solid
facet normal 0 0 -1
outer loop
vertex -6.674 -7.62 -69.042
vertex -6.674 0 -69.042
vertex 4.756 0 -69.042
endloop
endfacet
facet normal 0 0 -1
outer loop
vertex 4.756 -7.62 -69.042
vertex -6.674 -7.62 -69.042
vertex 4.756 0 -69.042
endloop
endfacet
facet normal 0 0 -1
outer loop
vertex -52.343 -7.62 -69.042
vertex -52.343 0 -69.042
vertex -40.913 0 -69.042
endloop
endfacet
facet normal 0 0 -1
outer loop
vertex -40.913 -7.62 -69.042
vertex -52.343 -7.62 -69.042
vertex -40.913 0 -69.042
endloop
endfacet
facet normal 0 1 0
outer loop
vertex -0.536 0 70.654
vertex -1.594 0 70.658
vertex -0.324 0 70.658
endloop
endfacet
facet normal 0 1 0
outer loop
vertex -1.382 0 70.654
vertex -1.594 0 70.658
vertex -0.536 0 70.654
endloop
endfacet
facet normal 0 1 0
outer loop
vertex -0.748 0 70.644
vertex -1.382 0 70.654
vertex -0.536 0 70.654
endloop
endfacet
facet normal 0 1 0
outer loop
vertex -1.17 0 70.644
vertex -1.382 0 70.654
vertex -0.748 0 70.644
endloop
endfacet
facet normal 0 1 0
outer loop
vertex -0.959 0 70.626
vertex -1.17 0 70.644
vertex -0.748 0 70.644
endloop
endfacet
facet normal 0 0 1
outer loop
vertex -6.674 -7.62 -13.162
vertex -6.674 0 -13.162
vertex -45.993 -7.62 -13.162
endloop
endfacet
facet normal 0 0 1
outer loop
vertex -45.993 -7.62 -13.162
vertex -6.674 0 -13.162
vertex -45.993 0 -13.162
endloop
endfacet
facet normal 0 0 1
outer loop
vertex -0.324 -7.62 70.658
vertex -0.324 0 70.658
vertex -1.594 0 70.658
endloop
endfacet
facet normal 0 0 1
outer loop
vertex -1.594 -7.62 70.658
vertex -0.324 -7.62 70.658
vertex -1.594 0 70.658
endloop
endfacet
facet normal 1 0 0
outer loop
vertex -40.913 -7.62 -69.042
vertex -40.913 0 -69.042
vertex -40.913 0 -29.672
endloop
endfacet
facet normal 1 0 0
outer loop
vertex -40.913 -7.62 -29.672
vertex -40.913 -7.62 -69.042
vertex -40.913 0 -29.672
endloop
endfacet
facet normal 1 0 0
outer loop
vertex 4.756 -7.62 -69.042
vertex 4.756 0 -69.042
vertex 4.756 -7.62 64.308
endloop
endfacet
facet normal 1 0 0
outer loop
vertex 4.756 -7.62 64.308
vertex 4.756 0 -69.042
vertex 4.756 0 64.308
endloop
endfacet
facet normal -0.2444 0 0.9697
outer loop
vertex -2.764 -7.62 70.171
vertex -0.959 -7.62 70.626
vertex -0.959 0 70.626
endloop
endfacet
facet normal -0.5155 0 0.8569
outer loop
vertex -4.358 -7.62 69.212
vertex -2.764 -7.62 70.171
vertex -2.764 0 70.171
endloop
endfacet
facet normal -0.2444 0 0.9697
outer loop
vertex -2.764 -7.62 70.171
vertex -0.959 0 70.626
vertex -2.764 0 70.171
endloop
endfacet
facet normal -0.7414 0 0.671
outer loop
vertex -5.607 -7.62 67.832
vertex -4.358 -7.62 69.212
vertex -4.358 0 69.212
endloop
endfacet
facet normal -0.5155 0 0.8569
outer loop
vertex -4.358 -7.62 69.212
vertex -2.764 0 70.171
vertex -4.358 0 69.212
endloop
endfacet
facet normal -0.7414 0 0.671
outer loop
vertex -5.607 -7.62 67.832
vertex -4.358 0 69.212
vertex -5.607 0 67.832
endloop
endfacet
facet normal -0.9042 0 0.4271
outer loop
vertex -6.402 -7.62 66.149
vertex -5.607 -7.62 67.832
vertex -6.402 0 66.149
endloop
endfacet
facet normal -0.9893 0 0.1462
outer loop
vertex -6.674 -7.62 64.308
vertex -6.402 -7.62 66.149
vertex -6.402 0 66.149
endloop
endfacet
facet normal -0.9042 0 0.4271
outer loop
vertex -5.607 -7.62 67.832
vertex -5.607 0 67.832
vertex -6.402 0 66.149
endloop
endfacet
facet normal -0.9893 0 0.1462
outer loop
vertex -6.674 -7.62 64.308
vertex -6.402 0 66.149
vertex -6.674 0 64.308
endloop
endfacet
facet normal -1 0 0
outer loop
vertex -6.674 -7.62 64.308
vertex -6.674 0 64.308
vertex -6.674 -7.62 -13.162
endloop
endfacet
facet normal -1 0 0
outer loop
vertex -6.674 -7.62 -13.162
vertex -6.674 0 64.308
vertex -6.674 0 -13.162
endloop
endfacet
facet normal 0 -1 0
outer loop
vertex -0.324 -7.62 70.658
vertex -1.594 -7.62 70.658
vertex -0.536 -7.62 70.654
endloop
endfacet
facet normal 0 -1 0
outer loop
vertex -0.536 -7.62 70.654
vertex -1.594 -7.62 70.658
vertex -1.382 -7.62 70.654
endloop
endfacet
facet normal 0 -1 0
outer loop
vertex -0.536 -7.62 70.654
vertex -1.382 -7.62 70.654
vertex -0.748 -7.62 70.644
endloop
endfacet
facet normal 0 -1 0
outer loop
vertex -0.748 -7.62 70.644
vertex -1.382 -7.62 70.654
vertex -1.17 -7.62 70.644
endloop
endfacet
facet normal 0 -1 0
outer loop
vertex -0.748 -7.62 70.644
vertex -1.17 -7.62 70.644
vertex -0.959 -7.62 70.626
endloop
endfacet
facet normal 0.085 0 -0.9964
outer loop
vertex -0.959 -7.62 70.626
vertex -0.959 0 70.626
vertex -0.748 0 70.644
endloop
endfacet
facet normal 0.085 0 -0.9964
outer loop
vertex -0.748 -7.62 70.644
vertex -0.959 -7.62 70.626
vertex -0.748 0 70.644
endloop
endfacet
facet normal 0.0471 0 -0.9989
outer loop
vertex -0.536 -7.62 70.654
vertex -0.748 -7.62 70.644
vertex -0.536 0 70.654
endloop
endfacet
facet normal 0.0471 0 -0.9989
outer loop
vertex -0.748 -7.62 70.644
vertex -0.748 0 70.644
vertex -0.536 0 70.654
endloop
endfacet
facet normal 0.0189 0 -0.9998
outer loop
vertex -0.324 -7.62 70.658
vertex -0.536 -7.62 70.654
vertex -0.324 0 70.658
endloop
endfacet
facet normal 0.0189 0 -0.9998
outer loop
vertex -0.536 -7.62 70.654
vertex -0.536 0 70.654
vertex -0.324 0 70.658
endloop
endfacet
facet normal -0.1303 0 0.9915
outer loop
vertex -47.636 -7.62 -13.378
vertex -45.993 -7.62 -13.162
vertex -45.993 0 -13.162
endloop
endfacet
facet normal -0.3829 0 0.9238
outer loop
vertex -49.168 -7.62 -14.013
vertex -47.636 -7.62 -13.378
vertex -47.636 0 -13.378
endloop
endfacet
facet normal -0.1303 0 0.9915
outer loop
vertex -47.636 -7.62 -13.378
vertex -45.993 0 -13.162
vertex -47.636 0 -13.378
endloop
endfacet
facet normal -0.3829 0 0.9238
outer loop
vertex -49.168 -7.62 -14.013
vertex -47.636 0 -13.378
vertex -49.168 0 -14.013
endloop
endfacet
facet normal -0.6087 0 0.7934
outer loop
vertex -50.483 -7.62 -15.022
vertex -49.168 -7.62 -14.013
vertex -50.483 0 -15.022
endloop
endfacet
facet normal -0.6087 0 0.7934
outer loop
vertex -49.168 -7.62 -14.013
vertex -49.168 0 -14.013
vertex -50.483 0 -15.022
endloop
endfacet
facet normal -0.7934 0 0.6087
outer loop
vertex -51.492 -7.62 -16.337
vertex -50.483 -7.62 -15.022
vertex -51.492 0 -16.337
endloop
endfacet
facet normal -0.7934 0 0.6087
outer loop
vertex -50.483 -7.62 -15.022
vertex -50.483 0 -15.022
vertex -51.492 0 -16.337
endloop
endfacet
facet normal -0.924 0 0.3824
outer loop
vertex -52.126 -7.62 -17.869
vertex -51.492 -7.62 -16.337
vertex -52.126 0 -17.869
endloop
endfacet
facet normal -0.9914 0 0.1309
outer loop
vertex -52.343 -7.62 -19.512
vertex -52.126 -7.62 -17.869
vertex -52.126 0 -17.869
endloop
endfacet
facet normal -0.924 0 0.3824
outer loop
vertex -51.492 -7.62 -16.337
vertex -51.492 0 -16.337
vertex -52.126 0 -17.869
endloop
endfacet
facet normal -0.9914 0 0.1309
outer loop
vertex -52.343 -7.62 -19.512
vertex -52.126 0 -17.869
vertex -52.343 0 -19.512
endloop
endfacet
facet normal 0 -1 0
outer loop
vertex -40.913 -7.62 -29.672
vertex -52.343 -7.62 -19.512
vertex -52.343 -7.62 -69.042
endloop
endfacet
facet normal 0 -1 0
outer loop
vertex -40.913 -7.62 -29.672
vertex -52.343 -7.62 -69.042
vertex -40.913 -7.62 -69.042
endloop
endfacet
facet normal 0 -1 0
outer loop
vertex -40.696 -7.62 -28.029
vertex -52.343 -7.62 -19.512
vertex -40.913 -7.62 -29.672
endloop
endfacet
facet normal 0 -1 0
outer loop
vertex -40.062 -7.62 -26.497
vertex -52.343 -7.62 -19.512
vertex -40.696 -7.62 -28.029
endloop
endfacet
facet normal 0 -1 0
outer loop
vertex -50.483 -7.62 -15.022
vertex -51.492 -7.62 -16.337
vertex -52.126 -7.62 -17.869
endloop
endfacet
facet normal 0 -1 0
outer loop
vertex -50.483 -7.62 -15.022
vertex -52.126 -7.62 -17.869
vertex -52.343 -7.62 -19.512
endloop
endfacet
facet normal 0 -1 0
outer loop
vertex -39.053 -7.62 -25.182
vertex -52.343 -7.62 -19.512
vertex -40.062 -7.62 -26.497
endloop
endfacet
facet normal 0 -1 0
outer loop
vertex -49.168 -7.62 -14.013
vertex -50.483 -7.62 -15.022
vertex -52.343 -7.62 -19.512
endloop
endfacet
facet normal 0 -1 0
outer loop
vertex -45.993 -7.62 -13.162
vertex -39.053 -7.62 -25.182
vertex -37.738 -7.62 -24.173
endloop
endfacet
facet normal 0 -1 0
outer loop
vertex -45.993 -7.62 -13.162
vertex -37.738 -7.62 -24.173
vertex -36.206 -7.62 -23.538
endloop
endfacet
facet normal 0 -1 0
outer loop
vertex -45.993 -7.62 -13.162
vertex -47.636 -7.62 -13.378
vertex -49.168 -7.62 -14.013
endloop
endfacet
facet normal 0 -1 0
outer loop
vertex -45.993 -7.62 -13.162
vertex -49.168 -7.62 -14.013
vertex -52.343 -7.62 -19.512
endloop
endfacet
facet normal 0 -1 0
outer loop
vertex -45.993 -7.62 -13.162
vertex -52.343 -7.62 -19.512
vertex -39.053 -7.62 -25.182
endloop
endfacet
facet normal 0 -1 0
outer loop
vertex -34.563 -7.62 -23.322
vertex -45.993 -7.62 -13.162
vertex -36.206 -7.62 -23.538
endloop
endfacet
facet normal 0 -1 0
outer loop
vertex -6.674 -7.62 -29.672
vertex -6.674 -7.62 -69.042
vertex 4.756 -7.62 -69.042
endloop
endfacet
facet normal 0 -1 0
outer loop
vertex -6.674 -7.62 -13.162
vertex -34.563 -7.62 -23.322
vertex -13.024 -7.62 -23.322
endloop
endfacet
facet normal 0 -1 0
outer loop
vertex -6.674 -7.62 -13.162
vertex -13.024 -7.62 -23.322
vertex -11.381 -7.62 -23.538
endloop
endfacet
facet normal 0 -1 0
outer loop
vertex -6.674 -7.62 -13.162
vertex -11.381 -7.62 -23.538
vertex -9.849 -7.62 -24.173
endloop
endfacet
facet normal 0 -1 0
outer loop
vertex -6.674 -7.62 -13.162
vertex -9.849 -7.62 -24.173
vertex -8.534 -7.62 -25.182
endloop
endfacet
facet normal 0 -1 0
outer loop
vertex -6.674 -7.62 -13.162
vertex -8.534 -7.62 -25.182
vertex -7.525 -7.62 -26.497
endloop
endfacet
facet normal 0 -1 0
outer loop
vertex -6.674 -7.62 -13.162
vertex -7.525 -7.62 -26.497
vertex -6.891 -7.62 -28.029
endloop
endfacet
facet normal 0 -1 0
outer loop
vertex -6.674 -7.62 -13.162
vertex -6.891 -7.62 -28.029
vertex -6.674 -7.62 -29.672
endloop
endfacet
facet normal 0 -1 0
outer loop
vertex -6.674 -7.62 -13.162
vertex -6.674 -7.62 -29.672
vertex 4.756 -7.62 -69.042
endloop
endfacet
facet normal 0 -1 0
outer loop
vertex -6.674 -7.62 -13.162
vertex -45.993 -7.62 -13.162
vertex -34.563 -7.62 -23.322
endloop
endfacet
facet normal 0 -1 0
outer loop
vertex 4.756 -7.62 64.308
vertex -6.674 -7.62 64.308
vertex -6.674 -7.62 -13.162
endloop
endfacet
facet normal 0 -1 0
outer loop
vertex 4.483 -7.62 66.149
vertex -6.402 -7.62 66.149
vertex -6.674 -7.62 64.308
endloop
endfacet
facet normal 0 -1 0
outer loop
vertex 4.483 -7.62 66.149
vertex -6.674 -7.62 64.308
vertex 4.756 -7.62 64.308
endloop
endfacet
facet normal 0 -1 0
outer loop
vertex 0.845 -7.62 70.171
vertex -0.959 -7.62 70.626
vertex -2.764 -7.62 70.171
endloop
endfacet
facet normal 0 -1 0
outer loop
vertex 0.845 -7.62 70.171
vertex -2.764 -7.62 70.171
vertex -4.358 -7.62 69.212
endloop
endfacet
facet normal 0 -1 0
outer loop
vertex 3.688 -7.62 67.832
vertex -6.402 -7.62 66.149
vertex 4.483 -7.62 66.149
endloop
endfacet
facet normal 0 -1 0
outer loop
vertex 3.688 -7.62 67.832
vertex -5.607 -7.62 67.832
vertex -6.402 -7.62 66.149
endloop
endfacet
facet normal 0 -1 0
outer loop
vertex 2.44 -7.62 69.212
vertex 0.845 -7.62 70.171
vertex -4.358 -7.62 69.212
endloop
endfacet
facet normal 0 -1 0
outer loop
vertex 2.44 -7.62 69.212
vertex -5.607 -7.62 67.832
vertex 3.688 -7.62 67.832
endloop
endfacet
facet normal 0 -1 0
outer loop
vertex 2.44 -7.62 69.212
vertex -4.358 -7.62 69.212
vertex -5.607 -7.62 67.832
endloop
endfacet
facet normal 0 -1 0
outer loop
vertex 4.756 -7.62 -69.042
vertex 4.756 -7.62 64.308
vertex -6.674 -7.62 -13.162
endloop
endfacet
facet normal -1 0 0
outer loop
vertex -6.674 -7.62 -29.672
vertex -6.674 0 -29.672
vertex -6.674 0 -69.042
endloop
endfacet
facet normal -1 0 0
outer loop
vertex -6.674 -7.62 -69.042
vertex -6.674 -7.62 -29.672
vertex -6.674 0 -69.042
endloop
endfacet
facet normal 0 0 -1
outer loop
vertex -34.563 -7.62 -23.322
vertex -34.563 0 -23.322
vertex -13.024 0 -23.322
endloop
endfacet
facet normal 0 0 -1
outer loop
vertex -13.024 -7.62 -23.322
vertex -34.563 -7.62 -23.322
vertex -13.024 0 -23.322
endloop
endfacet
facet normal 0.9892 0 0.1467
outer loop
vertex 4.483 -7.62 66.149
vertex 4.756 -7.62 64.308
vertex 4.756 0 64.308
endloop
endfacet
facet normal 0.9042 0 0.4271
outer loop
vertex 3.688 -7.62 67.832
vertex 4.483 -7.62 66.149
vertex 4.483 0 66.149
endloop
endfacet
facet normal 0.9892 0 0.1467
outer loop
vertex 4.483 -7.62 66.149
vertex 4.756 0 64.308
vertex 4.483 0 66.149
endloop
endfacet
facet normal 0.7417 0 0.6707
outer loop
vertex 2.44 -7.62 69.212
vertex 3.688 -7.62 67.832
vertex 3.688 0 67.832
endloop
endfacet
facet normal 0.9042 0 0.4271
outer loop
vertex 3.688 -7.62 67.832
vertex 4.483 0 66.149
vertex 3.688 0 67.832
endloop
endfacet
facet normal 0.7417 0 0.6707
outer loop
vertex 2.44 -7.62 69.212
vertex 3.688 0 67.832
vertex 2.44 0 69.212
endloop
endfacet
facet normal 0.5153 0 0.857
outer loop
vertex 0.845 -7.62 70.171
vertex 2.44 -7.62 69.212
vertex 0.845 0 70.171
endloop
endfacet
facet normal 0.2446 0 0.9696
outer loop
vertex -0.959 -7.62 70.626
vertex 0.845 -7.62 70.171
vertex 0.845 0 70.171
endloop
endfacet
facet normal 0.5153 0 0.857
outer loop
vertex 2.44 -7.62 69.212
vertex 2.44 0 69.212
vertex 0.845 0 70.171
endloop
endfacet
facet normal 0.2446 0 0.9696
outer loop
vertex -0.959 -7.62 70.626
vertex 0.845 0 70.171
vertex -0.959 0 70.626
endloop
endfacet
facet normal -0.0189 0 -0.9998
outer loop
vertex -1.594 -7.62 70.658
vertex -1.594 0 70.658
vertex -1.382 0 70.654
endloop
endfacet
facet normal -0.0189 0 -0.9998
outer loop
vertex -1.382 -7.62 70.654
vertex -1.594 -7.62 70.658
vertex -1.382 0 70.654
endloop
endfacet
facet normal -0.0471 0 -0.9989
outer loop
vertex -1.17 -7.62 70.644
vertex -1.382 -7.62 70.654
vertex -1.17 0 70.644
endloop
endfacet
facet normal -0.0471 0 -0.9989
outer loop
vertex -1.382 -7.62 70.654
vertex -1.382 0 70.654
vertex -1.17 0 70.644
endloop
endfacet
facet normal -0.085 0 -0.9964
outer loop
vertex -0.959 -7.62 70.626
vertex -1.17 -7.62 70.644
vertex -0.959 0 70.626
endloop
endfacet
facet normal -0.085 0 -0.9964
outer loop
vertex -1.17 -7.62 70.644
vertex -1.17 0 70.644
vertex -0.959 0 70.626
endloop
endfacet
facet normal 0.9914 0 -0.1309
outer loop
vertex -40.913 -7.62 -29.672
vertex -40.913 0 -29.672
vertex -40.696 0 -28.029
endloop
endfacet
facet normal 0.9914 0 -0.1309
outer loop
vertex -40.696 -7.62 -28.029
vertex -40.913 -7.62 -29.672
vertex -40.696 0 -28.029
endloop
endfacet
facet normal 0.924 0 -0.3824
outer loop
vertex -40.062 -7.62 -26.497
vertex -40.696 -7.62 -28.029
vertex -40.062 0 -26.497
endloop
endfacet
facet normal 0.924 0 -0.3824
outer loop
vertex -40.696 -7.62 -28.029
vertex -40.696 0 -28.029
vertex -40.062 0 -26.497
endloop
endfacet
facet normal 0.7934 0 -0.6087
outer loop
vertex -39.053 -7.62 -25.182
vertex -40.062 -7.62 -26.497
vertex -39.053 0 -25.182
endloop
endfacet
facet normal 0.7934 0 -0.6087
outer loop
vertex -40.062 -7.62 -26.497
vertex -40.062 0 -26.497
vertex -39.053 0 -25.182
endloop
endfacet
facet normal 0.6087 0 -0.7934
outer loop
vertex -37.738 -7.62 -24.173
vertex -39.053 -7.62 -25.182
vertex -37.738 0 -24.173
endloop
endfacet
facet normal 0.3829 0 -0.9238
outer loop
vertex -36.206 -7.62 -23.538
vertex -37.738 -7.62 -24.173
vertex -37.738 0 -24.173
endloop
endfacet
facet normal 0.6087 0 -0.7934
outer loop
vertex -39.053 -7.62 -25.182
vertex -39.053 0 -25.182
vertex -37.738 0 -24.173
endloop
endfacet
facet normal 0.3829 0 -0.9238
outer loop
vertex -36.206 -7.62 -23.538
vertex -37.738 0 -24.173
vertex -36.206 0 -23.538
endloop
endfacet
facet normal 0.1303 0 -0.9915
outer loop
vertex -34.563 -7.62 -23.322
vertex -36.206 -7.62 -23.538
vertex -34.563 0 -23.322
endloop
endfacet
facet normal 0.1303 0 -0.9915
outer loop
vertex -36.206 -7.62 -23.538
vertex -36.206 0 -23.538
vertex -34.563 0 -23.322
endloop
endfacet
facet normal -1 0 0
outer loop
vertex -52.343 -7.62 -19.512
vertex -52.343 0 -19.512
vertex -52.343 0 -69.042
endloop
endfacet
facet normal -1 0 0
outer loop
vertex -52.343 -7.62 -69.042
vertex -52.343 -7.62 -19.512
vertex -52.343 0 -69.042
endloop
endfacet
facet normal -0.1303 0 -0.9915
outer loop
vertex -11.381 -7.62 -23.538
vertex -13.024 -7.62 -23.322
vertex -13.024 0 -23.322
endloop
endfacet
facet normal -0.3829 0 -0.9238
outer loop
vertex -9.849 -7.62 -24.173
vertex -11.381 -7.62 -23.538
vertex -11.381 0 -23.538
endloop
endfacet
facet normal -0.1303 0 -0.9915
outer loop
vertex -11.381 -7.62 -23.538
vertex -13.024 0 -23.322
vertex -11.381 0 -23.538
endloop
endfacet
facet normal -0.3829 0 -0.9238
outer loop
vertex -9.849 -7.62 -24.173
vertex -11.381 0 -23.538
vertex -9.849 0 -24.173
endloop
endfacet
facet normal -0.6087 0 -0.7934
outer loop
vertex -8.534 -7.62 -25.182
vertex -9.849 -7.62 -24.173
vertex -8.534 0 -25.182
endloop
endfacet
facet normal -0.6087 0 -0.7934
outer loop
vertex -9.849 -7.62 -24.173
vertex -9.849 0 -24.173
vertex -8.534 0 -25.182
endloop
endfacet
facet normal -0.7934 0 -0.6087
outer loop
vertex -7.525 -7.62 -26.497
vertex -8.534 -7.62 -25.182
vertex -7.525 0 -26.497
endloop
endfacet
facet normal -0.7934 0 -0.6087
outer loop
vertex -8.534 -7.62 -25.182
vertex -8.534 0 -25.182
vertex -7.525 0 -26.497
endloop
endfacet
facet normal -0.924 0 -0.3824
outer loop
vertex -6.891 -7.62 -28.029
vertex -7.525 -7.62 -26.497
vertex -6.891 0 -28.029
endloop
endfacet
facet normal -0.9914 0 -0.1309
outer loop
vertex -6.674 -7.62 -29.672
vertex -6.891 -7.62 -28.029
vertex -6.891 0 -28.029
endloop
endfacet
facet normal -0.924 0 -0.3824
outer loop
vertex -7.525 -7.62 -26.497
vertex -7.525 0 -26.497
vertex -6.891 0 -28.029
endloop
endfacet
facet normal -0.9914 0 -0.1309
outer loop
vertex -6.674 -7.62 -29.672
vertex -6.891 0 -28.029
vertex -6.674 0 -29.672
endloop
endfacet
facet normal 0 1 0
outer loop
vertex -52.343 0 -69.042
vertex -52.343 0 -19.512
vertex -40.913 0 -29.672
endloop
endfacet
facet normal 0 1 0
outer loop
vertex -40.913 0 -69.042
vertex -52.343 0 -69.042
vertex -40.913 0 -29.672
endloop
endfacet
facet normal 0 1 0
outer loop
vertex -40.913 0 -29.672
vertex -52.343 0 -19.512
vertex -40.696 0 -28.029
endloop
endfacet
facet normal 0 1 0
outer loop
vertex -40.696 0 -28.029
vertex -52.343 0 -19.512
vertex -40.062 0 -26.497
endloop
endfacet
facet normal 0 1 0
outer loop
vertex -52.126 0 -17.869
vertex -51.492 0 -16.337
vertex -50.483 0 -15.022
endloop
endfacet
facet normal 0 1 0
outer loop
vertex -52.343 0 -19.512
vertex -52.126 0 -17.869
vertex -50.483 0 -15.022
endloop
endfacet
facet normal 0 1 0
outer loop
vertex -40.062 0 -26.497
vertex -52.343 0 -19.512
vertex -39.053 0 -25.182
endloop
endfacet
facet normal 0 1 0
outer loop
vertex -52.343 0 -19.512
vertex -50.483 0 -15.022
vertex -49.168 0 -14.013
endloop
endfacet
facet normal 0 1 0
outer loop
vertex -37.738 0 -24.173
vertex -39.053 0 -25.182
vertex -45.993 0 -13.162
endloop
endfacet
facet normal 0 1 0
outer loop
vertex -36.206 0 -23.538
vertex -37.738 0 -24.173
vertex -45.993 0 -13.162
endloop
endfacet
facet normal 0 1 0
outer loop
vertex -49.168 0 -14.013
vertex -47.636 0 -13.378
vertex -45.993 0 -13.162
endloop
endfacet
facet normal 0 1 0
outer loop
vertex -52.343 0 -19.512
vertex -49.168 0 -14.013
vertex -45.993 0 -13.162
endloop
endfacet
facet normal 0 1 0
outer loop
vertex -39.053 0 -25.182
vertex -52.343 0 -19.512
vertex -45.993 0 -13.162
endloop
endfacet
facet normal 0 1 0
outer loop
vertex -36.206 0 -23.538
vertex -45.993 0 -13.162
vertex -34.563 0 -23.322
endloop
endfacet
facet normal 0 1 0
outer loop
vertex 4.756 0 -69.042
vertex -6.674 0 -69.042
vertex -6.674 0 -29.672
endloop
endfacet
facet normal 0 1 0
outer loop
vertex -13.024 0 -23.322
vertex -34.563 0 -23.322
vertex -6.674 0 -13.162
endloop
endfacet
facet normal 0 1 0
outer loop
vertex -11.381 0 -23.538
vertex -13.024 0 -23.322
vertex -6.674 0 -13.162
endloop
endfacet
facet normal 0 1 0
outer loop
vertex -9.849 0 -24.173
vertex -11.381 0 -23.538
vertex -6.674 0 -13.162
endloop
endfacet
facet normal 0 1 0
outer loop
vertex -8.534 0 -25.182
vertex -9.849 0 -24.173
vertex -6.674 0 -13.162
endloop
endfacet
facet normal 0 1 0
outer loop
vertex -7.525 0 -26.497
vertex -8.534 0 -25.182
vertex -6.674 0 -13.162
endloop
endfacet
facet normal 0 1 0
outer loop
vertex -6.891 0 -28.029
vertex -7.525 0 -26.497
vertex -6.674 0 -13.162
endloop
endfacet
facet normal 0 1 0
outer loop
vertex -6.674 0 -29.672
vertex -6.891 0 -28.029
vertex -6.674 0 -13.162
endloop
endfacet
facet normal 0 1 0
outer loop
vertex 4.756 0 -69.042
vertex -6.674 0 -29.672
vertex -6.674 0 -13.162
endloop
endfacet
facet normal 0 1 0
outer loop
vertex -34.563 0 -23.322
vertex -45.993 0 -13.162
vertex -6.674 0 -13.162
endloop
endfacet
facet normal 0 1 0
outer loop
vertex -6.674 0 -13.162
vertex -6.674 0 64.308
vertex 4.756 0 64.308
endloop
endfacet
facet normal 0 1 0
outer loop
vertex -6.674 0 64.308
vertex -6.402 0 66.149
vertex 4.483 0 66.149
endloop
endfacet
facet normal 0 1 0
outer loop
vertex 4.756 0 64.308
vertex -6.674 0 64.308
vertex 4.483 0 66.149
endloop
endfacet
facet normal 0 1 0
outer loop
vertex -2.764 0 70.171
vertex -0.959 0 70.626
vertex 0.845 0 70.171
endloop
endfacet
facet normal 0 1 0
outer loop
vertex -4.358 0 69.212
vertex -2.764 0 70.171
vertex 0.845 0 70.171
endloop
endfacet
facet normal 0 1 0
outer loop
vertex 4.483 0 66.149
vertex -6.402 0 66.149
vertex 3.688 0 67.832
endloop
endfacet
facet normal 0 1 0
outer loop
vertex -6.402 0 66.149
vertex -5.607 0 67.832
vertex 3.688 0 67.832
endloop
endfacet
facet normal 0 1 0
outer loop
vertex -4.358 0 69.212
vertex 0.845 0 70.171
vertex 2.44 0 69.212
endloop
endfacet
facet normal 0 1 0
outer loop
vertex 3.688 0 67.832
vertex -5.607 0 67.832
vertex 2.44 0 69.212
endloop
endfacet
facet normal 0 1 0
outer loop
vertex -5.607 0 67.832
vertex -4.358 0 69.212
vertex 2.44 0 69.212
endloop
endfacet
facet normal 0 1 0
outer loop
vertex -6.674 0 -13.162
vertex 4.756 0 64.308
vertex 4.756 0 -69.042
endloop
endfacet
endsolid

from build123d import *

# Parameters (mm, degrees)
F1_DEPTH = 7.62


with BuildPart() as f1:
    # F0 (on Front) → F1 (new body)
    with BuildSketch(Plane.XZ):
        with BuildLine():
            ThreePointArc((-1.594196, 70.65798), (-1.276298, 70.650018), (-0.959196, 70.62615))
            ThreePointArc((-0.959196, 70.62615), (-0.642095, 70.650018), (-0.324196, 70.65798))
            Line((-0.324196, 70.65798), (-1.594196, 70.65798))
        make_face()
        with BuildLine():
            Line((-52.342728, -19.51202), (-52.342728, -69.04202))
            Line((-52.342728, -69.04202), (-40.912728, -69.04202))
            Line((-40.912728, -69.04202), (-40.912728, -29.67202))
            ThreePointArc((-40.912728, -29.67202), (-39.052856, -25.181892), (-34.562728, -23.32202))
            Line((-34.562728, -23.32202), (-13.024196, -23.32202))
            ThreePointArc((-13.024196, -23.32202), (-8.534068, -25.181892), (-6.674196, -29.67202))
            Line((-6.674196, -29.67202), (-6.674196, -69.04202))
            Line((-6.674196, -69.04202), (4.755804, -69.04202))
            Line((4.755804, -69.04202), (4.755804, -13.16202))
            Line((4.755804, -13.16202), (4.755804, 64.30798))
            ThreePointArc((4.755804, 64.30798), (3.11509, 68.56769), (-0.959196, 70.62615))
            ThreePointArc((-0.959196, 70.62615), (-5.033482, 68.56769), (-6.674196, 64.30798))
            Line((-6.674196, 64.30798), (-6.674196, -13.16202))
            Line((-6.674196, -13.16202), (-45.992728, -13.16202))
            ThreePointArc((-45.992728, -13.16202), (-50.482856, -15.021892), (-52.342728, -19.51202))
        make_face()
    extrude(amount=F1_DEPTH)


solid = f1.part
